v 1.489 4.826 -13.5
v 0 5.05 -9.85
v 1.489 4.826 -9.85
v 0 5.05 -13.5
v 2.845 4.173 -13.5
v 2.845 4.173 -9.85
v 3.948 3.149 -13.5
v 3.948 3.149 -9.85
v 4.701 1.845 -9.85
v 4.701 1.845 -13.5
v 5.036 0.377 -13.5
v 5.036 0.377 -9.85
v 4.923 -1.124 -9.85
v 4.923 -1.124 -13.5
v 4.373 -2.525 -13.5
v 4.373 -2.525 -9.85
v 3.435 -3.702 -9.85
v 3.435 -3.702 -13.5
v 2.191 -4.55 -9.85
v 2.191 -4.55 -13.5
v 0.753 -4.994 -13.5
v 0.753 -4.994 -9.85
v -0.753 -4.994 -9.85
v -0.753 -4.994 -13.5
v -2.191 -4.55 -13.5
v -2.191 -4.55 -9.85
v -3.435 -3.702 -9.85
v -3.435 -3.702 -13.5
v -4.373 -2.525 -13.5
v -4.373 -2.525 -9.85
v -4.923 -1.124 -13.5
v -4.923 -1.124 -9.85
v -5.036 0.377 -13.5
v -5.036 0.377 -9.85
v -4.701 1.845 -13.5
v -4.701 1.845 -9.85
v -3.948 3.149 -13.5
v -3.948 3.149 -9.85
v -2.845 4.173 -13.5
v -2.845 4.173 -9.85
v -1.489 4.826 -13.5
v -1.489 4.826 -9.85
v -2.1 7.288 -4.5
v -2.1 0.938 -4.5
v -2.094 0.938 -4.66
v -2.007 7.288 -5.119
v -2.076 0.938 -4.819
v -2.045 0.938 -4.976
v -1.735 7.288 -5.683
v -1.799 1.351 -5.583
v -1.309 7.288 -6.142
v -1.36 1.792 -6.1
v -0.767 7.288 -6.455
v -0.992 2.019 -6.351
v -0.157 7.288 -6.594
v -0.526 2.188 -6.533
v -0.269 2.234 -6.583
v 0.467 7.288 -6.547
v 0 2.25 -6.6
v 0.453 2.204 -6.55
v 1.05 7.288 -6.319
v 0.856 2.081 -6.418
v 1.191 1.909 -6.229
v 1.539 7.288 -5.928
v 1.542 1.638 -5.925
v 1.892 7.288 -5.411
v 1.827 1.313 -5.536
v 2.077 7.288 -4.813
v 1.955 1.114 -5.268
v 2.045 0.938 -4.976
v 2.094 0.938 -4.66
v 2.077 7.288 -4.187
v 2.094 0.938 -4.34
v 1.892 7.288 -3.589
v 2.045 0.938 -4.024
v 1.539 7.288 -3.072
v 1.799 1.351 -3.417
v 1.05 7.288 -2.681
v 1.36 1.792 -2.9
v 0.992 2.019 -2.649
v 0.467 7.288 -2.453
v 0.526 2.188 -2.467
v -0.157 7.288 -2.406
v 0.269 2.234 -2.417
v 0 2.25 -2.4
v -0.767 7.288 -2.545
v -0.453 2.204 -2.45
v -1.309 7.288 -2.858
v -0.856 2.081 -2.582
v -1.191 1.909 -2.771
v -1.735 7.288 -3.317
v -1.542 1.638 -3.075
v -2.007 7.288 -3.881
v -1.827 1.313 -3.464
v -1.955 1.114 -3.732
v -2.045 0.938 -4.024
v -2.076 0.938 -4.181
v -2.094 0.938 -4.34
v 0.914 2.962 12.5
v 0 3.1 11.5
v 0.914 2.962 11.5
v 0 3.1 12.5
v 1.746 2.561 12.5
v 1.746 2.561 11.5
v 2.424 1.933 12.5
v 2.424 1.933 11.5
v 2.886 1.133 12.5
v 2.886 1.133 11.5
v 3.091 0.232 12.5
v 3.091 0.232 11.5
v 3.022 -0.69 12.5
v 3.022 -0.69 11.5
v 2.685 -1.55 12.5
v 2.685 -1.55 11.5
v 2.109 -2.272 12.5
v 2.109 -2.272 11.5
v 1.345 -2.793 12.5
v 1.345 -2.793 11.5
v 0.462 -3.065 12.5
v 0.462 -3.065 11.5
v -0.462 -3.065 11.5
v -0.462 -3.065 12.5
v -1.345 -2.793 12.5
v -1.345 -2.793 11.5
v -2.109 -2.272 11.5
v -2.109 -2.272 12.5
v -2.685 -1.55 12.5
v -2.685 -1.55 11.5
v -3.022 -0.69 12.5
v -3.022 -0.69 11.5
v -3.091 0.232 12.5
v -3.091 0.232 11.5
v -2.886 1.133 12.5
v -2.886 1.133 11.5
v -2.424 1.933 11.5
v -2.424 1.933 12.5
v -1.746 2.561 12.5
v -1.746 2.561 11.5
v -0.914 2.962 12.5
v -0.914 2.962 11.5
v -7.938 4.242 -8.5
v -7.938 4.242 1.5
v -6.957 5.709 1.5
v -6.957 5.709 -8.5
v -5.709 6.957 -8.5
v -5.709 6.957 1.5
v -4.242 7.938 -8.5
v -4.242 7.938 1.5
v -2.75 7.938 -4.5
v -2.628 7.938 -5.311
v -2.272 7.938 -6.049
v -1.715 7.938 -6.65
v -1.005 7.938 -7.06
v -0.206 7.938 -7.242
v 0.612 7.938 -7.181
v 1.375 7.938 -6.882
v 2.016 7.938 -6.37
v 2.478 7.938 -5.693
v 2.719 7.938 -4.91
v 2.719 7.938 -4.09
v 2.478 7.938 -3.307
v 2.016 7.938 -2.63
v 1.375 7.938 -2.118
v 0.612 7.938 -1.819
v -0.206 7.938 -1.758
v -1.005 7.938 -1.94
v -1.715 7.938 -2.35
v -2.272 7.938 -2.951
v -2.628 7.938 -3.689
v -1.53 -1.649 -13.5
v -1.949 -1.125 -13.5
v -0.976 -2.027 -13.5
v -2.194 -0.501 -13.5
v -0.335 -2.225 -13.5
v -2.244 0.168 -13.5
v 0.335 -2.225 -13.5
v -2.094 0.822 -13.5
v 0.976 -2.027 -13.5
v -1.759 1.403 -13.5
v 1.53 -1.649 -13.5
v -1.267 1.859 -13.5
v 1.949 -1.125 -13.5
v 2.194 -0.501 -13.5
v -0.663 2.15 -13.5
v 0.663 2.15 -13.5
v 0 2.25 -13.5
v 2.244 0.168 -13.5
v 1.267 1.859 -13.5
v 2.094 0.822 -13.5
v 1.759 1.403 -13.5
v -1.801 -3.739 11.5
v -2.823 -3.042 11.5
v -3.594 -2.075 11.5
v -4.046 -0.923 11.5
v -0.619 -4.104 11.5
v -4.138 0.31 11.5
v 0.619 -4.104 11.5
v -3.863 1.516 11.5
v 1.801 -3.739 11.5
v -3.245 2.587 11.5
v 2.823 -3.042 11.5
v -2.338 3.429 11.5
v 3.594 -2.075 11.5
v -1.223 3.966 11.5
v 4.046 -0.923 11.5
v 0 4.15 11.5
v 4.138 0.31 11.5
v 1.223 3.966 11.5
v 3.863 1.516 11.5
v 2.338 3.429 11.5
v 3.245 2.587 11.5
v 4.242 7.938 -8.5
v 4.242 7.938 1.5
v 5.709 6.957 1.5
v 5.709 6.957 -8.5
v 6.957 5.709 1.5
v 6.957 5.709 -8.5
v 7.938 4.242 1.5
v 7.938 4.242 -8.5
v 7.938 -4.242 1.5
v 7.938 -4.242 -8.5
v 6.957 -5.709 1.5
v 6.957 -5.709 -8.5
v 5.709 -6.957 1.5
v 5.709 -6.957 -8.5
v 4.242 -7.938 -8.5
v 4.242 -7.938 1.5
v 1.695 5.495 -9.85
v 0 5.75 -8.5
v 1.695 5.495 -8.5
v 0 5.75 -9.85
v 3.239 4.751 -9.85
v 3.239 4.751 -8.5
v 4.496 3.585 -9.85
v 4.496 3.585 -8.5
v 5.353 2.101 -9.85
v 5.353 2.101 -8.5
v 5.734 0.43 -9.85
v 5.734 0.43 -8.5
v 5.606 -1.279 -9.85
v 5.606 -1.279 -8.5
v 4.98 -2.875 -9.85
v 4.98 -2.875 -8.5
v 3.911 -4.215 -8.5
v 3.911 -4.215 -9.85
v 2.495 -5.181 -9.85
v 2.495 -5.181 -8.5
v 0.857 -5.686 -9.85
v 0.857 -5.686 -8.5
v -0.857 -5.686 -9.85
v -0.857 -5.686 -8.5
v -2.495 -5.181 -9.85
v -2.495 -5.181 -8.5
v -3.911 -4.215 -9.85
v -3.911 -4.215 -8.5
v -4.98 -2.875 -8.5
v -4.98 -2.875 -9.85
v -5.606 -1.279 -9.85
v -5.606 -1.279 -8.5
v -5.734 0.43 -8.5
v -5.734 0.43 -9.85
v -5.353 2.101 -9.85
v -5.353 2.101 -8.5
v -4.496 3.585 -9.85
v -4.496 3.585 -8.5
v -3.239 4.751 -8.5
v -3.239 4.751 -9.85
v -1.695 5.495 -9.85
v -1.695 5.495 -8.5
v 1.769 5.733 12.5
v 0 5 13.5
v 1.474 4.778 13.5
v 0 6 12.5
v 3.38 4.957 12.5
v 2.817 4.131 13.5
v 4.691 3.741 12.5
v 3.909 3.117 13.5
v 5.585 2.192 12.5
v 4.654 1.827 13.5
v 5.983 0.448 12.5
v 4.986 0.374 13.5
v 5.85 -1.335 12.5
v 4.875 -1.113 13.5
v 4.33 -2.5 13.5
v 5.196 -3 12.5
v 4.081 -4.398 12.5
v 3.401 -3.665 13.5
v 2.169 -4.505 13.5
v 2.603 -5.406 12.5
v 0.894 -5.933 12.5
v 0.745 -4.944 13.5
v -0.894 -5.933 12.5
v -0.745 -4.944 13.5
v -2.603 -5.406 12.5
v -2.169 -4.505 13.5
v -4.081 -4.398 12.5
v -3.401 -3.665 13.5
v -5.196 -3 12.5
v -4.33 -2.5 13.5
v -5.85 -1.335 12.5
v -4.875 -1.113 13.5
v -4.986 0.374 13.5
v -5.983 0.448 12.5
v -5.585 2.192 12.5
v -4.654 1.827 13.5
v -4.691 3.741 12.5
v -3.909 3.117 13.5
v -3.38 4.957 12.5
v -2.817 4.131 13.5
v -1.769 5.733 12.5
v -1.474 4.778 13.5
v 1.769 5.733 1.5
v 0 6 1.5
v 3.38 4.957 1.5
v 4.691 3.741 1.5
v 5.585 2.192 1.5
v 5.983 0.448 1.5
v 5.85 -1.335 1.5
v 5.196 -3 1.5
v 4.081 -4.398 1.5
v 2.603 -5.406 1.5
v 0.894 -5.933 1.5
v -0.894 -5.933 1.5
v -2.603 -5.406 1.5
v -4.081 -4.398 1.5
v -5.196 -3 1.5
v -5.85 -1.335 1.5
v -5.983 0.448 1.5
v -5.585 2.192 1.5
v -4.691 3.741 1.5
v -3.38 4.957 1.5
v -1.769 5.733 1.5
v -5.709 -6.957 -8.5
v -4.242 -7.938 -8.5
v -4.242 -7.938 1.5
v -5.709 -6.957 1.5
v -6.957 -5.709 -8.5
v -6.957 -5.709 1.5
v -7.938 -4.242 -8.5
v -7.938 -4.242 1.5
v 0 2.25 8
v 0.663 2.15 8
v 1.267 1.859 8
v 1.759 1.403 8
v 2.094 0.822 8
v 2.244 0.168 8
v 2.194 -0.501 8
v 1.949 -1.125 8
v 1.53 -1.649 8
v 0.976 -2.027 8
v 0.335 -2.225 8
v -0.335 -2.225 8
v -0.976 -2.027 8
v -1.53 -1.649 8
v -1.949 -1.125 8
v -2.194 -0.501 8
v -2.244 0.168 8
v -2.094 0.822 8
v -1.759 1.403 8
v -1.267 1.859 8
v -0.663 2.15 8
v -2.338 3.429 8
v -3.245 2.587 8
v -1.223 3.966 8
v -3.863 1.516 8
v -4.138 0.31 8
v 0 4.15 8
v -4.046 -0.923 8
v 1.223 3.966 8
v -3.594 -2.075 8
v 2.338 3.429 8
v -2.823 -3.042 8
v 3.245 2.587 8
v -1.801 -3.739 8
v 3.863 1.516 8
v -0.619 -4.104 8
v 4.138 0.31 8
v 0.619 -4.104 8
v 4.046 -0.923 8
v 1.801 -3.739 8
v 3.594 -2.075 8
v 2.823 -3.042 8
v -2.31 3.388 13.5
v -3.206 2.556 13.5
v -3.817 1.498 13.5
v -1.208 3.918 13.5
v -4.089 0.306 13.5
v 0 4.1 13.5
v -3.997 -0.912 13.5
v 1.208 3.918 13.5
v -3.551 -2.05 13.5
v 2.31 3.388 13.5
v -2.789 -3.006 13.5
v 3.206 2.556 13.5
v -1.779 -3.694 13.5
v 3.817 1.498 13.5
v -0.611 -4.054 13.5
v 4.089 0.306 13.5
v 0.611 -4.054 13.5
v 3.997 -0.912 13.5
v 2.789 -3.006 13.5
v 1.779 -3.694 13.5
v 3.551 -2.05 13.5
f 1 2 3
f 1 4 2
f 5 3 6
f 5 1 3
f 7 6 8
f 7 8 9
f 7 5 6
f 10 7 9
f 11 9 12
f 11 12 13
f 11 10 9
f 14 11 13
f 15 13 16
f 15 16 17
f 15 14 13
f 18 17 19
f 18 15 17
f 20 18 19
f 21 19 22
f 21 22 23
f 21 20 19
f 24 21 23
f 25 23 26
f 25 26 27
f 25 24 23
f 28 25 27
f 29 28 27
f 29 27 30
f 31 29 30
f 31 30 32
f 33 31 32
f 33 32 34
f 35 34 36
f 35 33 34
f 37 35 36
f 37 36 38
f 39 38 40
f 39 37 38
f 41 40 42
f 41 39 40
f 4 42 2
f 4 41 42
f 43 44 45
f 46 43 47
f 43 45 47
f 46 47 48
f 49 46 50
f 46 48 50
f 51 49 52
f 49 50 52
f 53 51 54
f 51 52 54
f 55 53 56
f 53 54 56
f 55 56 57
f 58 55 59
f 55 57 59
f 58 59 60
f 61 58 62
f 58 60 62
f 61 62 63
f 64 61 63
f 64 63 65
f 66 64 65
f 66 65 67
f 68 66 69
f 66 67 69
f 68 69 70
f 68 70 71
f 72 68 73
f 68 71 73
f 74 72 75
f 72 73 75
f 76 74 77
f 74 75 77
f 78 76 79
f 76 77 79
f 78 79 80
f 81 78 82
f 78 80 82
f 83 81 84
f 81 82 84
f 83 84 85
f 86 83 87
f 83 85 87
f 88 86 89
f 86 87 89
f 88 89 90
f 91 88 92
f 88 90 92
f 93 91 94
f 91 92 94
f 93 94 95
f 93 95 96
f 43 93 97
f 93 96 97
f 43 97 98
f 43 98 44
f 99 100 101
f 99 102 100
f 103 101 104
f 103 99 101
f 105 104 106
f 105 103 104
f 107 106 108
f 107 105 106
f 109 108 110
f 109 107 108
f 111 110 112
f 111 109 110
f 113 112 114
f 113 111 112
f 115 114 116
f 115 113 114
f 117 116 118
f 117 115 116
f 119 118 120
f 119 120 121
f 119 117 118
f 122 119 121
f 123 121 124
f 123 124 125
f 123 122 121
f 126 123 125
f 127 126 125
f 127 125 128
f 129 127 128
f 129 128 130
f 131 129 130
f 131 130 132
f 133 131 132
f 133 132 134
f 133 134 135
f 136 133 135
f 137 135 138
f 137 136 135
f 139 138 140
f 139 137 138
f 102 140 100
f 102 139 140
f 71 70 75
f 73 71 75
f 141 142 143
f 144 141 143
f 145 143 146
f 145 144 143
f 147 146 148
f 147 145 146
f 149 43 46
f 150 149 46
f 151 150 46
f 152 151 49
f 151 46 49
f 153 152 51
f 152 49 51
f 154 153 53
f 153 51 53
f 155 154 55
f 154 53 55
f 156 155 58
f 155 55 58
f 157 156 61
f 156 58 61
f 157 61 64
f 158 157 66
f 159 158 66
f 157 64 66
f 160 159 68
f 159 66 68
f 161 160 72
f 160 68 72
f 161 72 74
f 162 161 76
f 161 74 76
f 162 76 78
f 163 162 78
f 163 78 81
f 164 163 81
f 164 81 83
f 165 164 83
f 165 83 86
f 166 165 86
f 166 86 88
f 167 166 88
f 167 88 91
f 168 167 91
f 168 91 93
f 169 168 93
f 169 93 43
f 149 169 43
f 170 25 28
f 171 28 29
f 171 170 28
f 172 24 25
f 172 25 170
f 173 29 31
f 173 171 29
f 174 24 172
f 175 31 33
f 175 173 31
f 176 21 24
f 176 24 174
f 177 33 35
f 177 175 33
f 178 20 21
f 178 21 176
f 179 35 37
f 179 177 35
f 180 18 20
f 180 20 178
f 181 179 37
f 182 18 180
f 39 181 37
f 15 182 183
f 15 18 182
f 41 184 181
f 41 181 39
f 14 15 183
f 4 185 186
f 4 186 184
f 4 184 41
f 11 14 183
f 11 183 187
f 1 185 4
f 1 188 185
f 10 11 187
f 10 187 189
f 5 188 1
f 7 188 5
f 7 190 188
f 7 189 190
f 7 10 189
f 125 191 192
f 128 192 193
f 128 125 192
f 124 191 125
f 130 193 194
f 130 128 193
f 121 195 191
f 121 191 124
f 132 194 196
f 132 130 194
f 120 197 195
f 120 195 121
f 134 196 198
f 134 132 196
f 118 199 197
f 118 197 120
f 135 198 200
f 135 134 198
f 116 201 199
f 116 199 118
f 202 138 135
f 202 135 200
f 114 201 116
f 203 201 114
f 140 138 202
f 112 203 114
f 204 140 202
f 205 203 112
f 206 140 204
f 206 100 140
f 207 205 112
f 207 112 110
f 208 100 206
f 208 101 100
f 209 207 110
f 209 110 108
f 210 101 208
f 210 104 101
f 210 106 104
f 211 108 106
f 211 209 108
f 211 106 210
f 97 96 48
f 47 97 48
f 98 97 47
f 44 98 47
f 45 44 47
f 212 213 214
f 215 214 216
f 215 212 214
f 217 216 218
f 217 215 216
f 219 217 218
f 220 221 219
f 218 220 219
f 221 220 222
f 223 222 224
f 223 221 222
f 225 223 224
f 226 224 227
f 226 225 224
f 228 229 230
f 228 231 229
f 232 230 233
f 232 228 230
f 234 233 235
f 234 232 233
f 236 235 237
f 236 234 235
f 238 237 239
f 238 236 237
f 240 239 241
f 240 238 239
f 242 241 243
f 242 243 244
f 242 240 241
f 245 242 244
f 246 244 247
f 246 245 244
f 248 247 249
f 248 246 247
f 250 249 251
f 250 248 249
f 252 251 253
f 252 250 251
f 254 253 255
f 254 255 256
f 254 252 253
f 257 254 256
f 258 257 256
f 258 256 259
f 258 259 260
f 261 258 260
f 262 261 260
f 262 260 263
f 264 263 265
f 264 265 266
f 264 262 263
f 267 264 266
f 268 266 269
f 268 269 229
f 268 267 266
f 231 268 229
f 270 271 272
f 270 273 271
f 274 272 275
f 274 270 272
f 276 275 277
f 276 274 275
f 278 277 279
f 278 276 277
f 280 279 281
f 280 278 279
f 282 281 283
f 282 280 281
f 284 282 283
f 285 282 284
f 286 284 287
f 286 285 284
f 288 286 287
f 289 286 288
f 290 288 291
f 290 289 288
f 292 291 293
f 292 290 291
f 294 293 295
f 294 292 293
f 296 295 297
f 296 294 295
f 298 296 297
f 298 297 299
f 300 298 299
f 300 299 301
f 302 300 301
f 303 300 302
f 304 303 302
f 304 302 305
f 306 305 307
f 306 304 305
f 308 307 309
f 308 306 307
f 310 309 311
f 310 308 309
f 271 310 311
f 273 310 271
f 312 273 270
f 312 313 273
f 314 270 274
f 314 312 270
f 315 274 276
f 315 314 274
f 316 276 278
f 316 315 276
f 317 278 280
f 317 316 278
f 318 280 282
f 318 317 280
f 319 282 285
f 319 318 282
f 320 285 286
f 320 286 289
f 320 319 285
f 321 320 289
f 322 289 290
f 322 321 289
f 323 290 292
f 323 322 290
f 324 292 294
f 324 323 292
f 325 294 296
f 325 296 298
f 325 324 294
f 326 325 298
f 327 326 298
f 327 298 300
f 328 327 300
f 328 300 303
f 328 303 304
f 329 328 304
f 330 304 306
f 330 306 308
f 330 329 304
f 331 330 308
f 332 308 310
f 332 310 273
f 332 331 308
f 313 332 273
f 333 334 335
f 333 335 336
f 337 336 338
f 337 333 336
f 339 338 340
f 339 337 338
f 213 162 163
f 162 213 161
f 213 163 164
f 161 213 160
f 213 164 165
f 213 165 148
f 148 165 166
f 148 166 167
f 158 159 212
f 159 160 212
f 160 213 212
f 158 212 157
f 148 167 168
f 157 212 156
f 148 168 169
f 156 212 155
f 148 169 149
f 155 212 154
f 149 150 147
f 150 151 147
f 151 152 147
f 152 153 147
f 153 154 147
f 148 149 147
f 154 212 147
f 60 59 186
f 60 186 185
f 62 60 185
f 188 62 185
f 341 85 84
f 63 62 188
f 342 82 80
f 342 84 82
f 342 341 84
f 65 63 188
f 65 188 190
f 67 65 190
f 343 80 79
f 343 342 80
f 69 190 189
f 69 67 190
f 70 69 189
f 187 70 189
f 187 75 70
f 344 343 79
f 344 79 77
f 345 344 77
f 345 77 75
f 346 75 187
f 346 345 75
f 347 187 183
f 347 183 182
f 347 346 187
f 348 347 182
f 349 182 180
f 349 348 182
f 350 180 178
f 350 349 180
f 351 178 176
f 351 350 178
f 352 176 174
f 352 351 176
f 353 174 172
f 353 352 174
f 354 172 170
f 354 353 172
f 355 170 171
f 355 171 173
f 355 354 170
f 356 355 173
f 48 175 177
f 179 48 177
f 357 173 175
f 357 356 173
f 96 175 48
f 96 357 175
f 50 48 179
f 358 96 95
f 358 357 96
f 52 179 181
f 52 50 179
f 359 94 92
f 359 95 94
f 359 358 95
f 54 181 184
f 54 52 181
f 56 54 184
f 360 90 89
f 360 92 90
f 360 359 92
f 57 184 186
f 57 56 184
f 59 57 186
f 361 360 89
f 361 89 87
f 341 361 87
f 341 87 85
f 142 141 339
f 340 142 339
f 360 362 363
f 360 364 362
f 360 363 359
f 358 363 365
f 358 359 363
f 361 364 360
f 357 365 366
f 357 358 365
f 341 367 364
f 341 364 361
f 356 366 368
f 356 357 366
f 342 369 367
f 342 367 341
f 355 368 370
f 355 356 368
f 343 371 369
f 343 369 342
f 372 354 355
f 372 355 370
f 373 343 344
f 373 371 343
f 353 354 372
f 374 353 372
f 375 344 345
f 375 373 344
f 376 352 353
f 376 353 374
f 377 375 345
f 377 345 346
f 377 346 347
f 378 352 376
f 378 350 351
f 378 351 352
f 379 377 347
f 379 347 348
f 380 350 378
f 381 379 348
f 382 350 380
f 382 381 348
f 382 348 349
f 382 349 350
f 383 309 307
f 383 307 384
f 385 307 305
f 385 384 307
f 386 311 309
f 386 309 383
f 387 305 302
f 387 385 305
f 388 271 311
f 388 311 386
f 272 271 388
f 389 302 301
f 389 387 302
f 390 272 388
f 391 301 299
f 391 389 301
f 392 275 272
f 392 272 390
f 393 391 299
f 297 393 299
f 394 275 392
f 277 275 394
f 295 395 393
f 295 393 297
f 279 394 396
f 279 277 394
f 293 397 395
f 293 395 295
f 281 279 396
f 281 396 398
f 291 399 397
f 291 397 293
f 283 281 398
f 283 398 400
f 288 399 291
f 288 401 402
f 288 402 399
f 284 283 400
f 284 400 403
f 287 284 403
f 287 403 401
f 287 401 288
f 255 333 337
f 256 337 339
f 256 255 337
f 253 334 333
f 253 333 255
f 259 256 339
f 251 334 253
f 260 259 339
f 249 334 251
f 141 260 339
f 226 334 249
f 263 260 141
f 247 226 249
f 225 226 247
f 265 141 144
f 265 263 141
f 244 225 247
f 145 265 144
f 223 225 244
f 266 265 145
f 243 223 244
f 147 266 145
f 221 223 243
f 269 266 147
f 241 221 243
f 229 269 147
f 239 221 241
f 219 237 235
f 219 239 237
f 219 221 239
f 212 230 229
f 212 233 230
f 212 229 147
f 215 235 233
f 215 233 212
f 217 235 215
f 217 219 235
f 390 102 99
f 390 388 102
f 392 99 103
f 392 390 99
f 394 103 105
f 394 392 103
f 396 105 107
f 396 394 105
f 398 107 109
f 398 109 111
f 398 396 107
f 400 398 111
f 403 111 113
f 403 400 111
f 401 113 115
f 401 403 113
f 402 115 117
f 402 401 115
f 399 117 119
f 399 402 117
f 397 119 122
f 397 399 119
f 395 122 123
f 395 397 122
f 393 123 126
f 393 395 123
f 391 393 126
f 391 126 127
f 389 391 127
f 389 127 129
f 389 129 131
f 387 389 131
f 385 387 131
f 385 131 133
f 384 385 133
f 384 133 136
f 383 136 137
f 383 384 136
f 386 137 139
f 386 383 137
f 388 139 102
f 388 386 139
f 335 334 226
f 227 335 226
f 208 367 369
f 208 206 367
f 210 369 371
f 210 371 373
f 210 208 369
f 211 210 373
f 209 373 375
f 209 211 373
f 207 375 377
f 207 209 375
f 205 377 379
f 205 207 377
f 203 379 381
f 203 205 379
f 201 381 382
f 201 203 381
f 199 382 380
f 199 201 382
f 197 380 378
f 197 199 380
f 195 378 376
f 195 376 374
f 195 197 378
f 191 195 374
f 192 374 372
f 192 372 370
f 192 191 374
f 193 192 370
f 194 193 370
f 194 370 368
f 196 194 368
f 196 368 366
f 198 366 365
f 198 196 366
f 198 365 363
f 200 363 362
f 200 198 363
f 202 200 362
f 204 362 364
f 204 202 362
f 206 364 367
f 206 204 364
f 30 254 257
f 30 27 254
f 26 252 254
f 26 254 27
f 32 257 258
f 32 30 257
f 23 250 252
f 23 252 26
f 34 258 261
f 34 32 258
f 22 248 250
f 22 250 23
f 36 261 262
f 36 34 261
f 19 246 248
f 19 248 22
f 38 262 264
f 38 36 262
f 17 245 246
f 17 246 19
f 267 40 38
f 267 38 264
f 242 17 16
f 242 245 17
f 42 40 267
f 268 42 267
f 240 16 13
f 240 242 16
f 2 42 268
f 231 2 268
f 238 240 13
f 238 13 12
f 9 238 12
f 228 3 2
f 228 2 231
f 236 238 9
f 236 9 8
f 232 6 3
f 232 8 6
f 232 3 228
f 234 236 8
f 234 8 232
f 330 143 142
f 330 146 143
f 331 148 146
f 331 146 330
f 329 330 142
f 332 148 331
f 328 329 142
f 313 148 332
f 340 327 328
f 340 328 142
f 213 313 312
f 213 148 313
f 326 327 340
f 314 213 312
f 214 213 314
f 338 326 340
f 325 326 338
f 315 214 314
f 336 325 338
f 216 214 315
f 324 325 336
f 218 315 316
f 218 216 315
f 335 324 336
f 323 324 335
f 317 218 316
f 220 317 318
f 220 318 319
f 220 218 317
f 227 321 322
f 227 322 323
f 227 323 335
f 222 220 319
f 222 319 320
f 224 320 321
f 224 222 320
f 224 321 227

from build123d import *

# Parameters (mm, degrees)
CUT_EXTRUDE2_REACH              = 24
M5X0_8_TAPPED_HOLE1_D           = 4.2
M5X0_8_TAPPED_HOLE1_DEPTH       = 7
M5X0_8_TAPPED_HOLE1_CSINK_D     = 5.5
M5X0_8_TAPPED_HOLE1_CSINK_ANGLE = 90


with BuildPart() as part:
    # Sketch1 → Revolve1 (revolve)
    with BuildSketch(Plane(origin=(0, 0, 0), x_dir=(0, 0, -1), z_dir=(1, 0, 0))):
        Polygon((-12.5, 3.1), (-13.5, 4.1), (-13.5, 5), (-12.5, 6), (-1.5, 6), (-1.5, 9), (8.5, 9), (8.5, 5.75), (9.85, 5.75), (9.85, 5.05), (13.5, 5.05), (13.5, 2.25), (-8, 2.25), (-8, 4.15), (-11.5, 4.15), (-11.5, 3.1), align=None)
    revolve(axis=Axis((0, 0, 0), (0, 0, -1)))

    # Sketch2 → Cut-Extrude2 (cut, up to next)
    with BuildSketch(Plane(origin=(0, 0, -8.5), x_dir=(-1, 0, 0), z_dir=(0, 0, -1)), mode=Mode.PRIVATE) as cut_extrude2_sk1:
        with BuildLine():
            ThreePointArc((4.242180306, 7.9375), (0, 9), (-4.242180306, 7.9375))
            Line((-4.242180306, 7.9375), (4.242180306, 7.9375))
        make_face()
    cut_extrude2_tool1 = extrude(cut_extrude2_sk1.sketch, amount=-CUT_EXTRUDE2_REACH, mode=Mode.PRIVATE) & part.part
    add(cut_extrude2_tool1.solids().sort_by_distance((0, 8.364726, -8.5))[0], mode=Mode.SUBTRACT)
    # Sketch2 → Cut-Extrude2 (cut, up to next)
    with BuildSketch(Plane(origin=(0, 0, -8.5), x_dir=(-1, 0, 0), z_dir=(0, 0, -1)), mode=Mode.PRIVATE) as cut_extrude2_sk2:
        with BuildLine():
            Line((-7.9375, -4.242180306), (-7.9375, 4.242180306))
            ThreePointArc((-7.9375, 4.242180306), (-9, 0), (-7.9375, -4.242180306))
        make_face()
    cut_extrude2_tool2 = extrude(cut_extrude2_sk2.sketch, amount=-CUT_EXTRUDE2_REACH, mode=Mode.PRIVATE) & part.part
    add(cut_extrude2_tool2.solids().sort_by_distance((8.364726, 0, -8.5))[0], mode=Mode.SUBTRACT)
    # Sketch2 → Cut-Extrude2 (cut, up to next)
    with BuildSketch(Plane(origin=(0, 0, -8.5), x_dir=(-1, 0, 0), z_dir=(0, 0, -1)), mode=Mode.PRIVATE) as cut_extrude2_sk3:
        with BuildLine():
            Line((4.242180306, -7.9375), (-4.242180306, -7.9375))
            ThreePointArc((-4.242180306, -7.9375), (0, -9), (4.242180306, -7.9375))
        make_face()
    cut_extrude2_tool3 = extrude(cut_extrude2_sk3.sketch, amount=-CUT_EXTRUDE2_REACH, mode=Mode.PRIVATE) & part.part
    add(cut_extrude2_tool3.solids().sort_by_distance((0, -8.364726, -8.5))[0], mode=Mode.SUBTRACT)
    # Sketch2 → Cut-Extrude2 (cut, up to next)
    with BuildSketch(Plane(origin=(0, 0, -8.5), x_dir=(-1, 0, 0), z_dir=(0, 0, -1)), mode=Mode.PRIVATE) as cut_extrude2_sk4:
        with BuildLine():
            ThreePointArc((9, 0), (8.730335045, 2.186606961), (7.9375, 4.242180306))
            Line((7.9375, 4.242180306), (7.9375, -4.242180306))
            ThreePointArc((7.9375, -4.242180306), (8.730335045, -2.186606961), (9, 0))
        make_face()
    cut_extrude2_tool4 = extrude(cut_extrude2_sk4.sketch, amount=-CUT_EXTRUDE2_REACH, mode=Mode.PRIVATE) & part.part
    add(cut_extrude2_tool4.solids().sort_by_distance((-8.364726, 0, -8.5))[0], mode=Mode.SUBTRACT)

    # M5x0.8 Tapped Hole1
    with Locations(Plane(origin=(0, 7.9375, 0), x_dir=(1, 0, 0), z_dir=(0, 1, 0))):
        with Locations((0, 4.5)):
            CounterSinkHole(M5X0_8_TAPPED_HOLE1_D / 2, M5X0_8_TAPPED_HOLE1_CSINK_D / 2, depth=M5X0_8_TAPPED_HOLE1_DEPTH, counter_sink_angle=M5X0_8_TAPPED_HOLE1_CSINK_ANGLE)


solid = part.part
